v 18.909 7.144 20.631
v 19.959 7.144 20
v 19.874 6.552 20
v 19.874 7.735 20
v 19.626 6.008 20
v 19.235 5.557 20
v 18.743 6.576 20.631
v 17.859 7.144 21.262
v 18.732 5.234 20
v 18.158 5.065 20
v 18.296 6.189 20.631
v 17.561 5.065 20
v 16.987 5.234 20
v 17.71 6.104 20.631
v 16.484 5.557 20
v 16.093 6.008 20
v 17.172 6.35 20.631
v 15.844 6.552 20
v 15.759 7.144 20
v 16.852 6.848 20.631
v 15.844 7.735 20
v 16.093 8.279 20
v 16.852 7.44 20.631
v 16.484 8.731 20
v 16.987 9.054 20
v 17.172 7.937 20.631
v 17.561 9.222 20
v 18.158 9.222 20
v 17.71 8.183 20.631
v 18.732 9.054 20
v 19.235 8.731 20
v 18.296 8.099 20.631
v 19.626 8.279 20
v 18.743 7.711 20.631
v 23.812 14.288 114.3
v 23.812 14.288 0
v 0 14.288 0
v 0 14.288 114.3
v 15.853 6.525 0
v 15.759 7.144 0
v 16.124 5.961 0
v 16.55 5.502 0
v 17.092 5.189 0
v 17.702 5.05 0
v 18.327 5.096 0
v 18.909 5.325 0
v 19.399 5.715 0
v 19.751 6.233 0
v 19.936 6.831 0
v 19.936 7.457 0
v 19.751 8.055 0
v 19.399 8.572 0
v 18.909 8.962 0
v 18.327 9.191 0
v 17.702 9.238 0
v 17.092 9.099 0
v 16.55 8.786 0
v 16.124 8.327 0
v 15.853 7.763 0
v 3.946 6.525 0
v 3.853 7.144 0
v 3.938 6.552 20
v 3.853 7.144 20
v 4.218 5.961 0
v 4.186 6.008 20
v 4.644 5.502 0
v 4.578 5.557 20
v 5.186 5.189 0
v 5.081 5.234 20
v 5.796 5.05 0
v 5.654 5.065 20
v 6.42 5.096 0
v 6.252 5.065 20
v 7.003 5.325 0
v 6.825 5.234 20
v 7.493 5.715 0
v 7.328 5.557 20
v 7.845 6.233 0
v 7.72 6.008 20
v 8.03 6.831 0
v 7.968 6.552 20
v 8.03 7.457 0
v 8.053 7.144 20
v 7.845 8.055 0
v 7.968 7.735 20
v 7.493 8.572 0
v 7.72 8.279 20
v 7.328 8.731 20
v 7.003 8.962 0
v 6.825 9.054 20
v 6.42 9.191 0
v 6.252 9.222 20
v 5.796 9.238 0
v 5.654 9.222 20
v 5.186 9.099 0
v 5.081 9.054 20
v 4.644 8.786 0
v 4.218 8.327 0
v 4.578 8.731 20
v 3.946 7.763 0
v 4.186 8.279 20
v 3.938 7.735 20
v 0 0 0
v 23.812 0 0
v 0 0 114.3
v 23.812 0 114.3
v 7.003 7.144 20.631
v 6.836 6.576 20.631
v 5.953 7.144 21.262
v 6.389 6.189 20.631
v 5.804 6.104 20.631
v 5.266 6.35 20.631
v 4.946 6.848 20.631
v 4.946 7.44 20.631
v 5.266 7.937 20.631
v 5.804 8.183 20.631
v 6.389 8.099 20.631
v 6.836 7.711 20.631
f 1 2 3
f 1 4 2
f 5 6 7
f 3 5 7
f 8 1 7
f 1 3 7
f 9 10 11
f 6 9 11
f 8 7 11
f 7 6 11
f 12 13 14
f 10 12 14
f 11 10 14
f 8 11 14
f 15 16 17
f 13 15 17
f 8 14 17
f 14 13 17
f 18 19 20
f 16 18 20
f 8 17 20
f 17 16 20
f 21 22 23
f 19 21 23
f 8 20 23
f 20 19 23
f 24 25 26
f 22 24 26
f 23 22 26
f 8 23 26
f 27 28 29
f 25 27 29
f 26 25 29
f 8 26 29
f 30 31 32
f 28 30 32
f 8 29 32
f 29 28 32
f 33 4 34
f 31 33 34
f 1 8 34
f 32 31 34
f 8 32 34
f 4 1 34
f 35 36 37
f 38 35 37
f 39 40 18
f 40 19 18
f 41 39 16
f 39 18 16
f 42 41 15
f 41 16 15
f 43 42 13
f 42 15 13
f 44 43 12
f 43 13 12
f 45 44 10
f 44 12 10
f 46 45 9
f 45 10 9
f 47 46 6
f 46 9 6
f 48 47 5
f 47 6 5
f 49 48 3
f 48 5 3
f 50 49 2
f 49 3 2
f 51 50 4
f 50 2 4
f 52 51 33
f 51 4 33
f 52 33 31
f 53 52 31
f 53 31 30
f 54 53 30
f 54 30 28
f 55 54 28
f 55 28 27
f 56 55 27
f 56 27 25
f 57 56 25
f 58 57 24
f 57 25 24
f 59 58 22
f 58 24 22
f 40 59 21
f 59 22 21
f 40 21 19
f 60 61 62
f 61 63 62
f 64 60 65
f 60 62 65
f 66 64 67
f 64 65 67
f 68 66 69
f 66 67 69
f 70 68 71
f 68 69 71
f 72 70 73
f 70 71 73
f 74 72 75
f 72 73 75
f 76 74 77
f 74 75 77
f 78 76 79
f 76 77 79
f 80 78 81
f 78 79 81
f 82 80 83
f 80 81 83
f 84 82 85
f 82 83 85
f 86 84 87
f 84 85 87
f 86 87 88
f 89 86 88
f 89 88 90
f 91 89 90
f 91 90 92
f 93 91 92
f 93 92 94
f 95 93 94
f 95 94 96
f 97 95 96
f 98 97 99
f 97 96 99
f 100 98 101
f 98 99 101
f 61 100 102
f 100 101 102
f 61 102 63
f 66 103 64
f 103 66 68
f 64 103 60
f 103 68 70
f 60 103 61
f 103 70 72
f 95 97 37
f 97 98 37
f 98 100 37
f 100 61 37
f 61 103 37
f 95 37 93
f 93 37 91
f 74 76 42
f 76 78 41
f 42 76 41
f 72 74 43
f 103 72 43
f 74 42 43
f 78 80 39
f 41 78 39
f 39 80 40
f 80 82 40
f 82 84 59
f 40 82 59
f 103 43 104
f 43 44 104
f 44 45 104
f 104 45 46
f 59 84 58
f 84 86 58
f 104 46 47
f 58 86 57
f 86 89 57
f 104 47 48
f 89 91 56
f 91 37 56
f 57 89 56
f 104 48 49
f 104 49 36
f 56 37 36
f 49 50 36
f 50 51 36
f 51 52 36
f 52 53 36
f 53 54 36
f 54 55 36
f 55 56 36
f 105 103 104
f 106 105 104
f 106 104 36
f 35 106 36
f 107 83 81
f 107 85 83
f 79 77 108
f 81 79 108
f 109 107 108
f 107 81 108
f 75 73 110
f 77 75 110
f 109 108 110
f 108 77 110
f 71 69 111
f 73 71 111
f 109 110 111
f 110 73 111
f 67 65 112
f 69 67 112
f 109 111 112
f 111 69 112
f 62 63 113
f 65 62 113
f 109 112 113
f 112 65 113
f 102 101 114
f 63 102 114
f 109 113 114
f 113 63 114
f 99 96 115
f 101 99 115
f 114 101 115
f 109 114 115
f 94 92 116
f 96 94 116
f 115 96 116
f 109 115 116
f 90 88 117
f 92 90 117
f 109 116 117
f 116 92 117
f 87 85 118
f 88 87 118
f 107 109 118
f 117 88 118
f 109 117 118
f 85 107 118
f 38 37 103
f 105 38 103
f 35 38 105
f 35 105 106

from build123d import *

# Parameters (mm, degrees)
F0_R     = 2.5
F1_DEPTH = 114.3
F2_D     = 4.2
F2_DEPTH = 20
F2_TIP   = 1.2618073


with BuildPart() as f1:
    # F0 (on Top) → F1 (new body)
    with BuildSketch(Plane.XY):
        Polygon((23.8125, 14.2875), (11.90625, 14.2875), (0, 14.2875), (0, 0), (11.90625, 0), (23.8125, 0), align=None)
        with Locations((5.953125, 7.14375)):
            Circle(F0_R, mode=Mode.SUBTRACT)
        with Locations((17.859375, 7.14375)):
            Circle(F0_R, mode=Mode.SUBTRACT)
        with Locations((5.953125, 7.14375)):
            Circle(F0_R)
        with Locations((17.859375, 7.14375)):
            Circle(F0_R)
    extrude(amount=F1_DEPTH)

    # F2
    with Locations(Plane(origin=(0, 0, 0), x_dir=(1, 0, 0), z_dir=(0, 0, -1))):
        with Locations((17.859375, -7.14375), (5.953125, -7.14375)):
            Hole(F2_D / 2, depth=F2_DEPTH)
            with Locations((0, 0, -(F2_DEPTH + F2_TIP / 2))):  # 118° drill point
                Cone(0, F2_D / 2, F2_TIP, mode=Mode.SUBTRACT)


solid = f1.part
